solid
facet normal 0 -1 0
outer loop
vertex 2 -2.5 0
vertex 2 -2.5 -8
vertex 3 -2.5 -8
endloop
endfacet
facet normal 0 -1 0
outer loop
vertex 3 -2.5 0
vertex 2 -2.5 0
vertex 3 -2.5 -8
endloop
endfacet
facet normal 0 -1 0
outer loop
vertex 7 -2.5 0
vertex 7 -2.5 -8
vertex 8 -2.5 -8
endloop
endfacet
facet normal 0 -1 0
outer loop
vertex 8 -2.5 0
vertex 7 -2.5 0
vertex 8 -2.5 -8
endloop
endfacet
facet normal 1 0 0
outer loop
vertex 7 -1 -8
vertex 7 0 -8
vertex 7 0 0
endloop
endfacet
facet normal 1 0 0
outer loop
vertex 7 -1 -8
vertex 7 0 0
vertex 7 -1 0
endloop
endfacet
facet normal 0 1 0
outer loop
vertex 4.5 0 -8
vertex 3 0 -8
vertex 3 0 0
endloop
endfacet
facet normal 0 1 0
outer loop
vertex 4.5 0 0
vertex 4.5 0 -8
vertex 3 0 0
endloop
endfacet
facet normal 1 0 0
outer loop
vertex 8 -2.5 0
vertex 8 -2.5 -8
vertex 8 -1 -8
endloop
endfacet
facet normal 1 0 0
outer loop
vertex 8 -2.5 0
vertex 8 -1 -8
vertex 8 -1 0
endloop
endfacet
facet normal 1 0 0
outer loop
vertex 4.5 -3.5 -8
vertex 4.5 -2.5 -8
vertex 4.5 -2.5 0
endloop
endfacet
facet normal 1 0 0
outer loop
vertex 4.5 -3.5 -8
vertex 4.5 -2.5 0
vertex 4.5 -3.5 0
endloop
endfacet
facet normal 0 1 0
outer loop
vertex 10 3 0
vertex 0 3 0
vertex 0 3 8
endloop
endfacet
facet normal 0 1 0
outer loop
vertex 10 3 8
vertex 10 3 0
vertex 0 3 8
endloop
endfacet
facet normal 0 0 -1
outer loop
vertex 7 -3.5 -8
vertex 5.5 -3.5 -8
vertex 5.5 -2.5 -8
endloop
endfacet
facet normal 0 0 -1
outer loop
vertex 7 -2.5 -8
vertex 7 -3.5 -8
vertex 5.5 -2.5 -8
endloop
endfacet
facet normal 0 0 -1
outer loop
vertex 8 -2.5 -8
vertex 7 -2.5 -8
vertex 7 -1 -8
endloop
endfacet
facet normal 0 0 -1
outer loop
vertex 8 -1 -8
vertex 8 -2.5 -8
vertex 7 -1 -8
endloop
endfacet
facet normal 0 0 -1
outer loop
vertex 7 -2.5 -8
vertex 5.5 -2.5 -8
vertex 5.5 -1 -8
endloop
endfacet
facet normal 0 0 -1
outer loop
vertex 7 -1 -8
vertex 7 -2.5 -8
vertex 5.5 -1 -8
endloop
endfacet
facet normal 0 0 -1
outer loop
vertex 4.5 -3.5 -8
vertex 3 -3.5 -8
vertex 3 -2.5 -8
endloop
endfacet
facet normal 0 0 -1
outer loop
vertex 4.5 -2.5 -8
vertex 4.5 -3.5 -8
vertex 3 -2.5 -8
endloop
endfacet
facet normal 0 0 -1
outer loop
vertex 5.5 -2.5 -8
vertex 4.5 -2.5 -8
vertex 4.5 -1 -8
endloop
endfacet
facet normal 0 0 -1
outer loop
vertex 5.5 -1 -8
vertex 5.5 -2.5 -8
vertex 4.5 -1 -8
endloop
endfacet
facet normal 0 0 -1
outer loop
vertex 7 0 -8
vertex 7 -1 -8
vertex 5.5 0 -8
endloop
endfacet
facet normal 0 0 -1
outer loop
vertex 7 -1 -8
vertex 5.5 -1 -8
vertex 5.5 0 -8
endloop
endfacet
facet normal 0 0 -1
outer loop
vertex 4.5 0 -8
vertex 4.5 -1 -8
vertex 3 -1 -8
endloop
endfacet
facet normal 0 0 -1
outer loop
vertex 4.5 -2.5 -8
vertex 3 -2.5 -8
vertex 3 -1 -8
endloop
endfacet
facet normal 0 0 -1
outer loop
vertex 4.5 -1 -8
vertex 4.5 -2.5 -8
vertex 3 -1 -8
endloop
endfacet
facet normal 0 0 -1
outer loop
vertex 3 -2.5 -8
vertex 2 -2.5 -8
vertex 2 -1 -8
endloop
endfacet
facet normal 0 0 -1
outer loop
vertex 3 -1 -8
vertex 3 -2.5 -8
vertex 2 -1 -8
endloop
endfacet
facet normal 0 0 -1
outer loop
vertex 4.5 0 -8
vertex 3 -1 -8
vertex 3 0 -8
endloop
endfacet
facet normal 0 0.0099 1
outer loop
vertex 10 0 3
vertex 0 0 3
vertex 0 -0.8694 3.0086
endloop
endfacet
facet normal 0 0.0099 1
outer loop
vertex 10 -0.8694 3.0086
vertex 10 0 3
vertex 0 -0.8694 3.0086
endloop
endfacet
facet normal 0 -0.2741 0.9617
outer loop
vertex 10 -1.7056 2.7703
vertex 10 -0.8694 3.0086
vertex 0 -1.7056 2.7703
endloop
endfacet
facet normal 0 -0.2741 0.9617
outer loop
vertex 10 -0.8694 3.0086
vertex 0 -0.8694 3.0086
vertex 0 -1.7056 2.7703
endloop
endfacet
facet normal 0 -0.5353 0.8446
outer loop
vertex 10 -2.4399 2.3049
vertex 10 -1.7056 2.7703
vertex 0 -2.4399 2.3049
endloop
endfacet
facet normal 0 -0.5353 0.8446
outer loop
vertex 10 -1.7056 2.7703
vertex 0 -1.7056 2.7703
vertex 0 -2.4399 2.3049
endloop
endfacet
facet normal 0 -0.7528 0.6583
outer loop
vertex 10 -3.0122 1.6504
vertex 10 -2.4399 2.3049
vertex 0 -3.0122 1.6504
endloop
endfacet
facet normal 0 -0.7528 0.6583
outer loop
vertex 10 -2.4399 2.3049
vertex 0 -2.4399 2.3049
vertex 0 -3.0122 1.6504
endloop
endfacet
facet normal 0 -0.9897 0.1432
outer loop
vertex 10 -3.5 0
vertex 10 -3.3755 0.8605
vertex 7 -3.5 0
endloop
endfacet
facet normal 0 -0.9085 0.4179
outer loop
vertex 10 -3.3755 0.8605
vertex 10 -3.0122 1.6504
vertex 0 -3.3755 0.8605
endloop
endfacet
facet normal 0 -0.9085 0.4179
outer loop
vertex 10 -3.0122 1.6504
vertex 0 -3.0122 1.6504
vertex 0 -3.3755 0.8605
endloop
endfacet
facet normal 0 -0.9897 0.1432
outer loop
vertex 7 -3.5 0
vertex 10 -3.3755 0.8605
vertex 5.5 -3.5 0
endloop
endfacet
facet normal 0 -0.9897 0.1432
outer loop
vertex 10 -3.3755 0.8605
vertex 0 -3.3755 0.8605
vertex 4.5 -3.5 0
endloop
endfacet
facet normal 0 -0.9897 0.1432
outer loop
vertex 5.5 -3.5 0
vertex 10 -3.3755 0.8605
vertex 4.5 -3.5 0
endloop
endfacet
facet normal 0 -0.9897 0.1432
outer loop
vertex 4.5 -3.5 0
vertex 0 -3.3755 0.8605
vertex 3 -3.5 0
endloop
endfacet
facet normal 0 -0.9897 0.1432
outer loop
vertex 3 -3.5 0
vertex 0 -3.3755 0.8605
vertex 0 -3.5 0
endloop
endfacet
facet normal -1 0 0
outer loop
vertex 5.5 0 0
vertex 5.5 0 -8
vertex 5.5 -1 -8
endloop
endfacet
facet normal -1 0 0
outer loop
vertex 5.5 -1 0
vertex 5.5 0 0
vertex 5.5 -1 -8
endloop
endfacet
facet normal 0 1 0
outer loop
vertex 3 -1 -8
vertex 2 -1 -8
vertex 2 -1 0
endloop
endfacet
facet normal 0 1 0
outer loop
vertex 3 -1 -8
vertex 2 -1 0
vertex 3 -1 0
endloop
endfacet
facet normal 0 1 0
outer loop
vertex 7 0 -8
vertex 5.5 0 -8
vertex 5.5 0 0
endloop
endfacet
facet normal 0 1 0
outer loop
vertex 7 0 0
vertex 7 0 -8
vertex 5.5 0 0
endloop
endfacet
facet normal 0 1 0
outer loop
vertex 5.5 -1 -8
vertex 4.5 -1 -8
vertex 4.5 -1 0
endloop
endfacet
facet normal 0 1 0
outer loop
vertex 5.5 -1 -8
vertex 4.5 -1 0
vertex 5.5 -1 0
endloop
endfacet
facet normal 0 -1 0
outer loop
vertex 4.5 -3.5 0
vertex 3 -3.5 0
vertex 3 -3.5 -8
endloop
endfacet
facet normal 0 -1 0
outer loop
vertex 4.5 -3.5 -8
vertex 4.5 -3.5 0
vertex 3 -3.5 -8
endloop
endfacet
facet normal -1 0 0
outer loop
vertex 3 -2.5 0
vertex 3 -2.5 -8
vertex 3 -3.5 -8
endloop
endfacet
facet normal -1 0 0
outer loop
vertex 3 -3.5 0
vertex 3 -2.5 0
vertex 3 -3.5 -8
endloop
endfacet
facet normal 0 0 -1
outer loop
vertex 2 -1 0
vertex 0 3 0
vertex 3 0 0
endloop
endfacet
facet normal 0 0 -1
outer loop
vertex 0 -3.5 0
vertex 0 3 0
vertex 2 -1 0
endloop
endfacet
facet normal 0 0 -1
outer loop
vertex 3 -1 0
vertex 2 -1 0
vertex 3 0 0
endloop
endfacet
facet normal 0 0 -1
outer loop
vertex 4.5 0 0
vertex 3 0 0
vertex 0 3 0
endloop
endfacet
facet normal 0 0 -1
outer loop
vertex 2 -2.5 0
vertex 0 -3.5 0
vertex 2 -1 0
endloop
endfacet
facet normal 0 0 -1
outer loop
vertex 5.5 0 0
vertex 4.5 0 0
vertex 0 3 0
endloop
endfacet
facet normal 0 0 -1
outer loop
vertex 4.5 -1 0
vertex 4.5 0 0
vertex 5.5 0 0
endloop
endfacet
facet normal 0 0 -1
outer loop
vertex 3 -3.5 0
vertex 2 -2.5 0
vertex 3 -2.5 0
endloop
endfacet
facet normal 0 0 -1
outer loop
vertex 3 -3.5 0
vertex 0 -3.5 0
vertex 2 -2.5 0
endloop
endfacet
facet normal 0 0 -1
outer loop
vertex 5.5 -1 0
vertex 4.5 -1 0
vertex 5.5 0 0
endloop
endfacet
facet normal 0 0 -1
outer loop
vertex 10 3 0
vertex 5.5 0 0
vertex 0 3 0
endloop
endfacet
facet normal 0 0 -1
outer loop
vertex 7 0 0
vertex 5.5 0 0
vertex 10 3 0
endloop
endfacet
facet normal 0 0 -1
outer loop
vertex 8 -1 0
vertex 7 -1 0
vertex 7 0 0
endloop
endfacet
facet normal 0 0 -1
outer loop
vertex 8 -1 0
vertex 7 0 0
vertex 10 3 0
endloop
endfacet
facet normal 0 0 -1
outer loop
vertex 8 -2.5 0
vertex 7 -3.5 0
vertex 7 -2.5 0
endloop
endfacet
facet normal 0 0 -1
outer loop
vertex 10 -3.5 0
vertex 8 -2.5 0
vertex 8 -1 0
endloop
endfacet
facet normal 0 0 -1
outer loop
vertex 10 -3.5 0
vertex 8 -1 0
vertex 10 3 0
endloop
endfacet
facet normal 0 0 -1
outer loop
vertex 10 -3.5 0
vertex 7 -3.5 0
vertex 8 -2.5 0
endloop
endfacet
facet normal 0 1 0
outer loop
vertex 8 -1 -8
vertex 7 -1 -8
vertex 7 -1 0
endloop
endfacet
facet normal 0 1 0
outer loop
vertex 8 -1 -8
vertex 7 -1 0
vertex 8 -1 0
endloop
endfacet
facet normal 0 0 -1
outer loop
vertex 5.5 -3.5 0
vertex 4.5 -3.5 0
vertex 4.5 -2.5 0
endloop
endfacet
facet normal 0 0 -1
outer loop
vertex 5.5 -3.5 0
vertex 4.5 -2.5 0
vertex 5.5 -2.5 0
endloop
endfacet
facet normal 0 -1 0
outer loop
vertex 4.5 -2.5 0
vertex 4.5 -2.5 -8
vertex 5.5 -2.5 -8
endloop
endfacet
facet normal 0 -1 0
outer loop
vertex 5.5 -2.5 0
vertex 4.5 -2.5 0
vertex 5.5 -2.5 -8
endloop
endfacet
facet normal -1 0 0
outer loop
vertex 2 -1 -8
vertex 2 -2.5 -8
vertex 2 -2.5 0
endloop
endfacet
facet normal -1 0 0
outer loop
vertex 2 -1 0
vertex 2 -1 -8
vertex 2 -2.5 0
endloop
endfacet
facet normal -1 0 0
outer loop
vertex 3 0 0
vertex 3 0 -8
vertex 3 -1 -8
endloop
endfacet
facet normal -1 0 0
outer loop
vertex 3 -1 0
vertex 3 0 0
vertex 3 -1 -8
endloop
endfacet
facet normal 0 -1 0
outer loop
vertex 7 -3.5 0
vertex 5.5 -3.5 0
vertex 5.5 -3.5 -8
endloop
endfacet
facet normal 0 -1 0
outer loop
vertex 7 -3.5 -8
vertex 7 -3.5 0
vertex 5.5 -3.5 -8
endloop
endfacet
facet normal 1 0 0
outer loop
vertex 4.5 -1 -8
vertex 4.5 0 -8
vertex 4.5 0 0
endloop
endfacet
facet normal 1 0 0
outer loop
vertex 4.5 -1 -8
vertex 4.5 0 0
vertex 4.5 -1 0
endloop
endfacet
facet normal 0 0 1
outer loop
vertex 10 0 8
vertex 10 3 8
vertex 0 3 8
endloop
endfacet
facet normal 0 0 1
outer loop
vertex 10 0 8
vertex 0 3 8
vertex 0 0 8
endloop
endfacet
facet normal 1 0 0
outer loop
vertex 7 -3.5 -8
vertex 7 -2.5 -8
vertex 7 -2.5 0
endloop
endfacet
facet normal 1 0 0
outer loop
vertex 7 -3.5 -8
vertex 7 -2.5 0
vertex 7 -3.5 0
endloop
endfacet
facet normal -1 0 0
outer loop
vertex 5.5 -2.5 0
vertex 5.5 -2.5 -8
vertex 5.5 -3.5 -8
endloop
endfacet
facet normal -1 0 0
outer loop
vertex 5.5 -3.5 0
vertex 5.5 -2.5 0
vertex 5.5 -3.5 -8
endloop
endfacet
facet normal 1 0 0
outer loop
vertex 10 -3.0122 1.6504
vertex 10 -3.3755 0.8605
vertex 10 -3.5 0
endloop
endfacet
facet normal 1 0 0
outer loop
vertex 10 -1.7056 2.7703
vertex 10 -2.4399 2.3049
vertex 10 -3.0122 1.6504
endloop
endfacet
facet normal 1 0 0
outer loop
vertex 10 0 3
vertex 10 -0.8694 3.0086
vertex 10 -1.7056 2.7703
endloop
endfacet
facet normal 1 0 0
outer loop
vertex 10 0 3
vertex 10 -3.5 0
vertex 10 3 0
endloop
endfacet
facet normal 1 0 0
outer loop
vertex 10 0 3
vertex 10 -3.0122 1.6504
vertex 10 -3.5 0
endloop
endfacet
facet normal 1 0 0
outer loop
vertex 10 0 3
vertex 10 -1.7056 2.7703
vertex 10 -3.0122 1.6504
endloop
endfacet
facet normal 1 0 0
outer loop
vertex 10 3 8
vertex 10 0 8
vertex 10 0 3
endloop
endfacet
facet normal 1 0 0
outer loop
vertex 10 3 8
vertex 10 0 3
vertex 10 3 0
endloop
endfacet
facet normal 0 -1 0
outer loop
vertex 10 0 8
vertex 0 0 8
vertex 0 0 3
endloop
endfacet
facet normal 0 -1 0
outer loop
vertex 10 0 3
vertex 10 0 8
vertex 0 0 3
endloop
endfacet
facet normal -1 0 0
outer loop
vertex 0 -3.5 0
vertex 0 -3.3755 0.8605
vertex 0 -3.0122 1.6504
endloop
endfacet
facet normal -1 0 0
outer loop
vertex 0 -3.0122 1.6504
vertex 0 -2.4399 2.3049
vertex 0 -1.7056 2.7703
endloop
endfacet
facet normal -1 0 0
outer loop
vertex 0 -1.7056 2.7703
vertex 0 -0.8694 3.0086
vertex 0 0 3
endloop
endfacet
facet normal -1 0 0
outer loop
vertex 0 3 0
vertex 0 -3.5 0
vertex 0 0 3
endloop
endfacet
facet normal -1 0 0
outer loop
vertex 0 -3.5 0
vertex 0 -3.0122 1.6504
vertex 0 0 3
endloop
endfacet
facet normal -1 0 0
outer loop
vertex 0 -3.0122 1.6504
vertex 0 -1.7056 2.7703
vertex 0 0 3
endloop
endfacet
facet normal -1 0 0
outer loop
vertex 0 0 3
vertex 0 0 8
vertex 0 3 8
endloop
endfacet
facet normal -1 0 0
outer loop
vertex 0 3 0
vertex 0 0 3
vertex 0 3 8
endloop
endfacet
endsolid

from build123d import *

# Parameters (mm, degrees)
F1_DEPTH = 10
F2_W     = 2
F2_H     = 8
F3_DEPTH = 6.501
F4_W     = 1
F4_H     = 1
F5_DEPTH = 8


with BuildPart() as f1:
    # F0 (on Right) → F1 (new body)
    with BuildSketch(Plane.YZ):
        with BuildLine():
            Line((-3.5, -8), (0, -8))
            Line((0, -8), (0, 0))
            Line((0, 0), (3, 0))
            Line((3, 0), (3, 8))
            Line((3, 8), (0, 8))
            Line((0, 8), (0, 3))
            ThreePointArc((0, 3), (-2.439902, 2.304886), (-3.5, 0))
            Line((-3.5, 0), (-3.5, -8))
        make_face()
    extrude(amount=F1_DEPTH)

    # F2 (on face) → F3 (cut, through all)
    with BuildSketch(Plane.XZ.offset(3.5)):
        with Locations((1, -4)):
            Rectangle(F2_W, F2_H)
        with Locations((9, -4)):
            Rectangle(F2_W, F2_H)
    extrude(amount=-F3_DEPTH, mode=Mode.SUBTRACT)

    # F4 (on face) → F5 (cut)
    with BuildSketch(Plane(origin=(0, 0, -8), x_dir=(1, 0, 0), z_dir=(0, 0, -1))):
        with Locations((2.5, 3)):
            Rectangle(F4_W, F4_H)
        with Locations((2.5, 0.5)):
            Rectangle(F4_W, F4_H)
        with Locations((7.5, 0.5)):
            Rectangle(F4_W, F4_H)
        with Locations((7.5, 3)):
            Rectangle(F4_W, F4_H)
        with Locations((5, 3)):
            Rectangle(F4_W, F4_H)
        with Locations((5, 0.5)):
            Rectangle(F4_W, F4_H)
    extrude(amount=-F5_DEPTH, mode=Mode.SUBTRACT)


solid = f1.part
